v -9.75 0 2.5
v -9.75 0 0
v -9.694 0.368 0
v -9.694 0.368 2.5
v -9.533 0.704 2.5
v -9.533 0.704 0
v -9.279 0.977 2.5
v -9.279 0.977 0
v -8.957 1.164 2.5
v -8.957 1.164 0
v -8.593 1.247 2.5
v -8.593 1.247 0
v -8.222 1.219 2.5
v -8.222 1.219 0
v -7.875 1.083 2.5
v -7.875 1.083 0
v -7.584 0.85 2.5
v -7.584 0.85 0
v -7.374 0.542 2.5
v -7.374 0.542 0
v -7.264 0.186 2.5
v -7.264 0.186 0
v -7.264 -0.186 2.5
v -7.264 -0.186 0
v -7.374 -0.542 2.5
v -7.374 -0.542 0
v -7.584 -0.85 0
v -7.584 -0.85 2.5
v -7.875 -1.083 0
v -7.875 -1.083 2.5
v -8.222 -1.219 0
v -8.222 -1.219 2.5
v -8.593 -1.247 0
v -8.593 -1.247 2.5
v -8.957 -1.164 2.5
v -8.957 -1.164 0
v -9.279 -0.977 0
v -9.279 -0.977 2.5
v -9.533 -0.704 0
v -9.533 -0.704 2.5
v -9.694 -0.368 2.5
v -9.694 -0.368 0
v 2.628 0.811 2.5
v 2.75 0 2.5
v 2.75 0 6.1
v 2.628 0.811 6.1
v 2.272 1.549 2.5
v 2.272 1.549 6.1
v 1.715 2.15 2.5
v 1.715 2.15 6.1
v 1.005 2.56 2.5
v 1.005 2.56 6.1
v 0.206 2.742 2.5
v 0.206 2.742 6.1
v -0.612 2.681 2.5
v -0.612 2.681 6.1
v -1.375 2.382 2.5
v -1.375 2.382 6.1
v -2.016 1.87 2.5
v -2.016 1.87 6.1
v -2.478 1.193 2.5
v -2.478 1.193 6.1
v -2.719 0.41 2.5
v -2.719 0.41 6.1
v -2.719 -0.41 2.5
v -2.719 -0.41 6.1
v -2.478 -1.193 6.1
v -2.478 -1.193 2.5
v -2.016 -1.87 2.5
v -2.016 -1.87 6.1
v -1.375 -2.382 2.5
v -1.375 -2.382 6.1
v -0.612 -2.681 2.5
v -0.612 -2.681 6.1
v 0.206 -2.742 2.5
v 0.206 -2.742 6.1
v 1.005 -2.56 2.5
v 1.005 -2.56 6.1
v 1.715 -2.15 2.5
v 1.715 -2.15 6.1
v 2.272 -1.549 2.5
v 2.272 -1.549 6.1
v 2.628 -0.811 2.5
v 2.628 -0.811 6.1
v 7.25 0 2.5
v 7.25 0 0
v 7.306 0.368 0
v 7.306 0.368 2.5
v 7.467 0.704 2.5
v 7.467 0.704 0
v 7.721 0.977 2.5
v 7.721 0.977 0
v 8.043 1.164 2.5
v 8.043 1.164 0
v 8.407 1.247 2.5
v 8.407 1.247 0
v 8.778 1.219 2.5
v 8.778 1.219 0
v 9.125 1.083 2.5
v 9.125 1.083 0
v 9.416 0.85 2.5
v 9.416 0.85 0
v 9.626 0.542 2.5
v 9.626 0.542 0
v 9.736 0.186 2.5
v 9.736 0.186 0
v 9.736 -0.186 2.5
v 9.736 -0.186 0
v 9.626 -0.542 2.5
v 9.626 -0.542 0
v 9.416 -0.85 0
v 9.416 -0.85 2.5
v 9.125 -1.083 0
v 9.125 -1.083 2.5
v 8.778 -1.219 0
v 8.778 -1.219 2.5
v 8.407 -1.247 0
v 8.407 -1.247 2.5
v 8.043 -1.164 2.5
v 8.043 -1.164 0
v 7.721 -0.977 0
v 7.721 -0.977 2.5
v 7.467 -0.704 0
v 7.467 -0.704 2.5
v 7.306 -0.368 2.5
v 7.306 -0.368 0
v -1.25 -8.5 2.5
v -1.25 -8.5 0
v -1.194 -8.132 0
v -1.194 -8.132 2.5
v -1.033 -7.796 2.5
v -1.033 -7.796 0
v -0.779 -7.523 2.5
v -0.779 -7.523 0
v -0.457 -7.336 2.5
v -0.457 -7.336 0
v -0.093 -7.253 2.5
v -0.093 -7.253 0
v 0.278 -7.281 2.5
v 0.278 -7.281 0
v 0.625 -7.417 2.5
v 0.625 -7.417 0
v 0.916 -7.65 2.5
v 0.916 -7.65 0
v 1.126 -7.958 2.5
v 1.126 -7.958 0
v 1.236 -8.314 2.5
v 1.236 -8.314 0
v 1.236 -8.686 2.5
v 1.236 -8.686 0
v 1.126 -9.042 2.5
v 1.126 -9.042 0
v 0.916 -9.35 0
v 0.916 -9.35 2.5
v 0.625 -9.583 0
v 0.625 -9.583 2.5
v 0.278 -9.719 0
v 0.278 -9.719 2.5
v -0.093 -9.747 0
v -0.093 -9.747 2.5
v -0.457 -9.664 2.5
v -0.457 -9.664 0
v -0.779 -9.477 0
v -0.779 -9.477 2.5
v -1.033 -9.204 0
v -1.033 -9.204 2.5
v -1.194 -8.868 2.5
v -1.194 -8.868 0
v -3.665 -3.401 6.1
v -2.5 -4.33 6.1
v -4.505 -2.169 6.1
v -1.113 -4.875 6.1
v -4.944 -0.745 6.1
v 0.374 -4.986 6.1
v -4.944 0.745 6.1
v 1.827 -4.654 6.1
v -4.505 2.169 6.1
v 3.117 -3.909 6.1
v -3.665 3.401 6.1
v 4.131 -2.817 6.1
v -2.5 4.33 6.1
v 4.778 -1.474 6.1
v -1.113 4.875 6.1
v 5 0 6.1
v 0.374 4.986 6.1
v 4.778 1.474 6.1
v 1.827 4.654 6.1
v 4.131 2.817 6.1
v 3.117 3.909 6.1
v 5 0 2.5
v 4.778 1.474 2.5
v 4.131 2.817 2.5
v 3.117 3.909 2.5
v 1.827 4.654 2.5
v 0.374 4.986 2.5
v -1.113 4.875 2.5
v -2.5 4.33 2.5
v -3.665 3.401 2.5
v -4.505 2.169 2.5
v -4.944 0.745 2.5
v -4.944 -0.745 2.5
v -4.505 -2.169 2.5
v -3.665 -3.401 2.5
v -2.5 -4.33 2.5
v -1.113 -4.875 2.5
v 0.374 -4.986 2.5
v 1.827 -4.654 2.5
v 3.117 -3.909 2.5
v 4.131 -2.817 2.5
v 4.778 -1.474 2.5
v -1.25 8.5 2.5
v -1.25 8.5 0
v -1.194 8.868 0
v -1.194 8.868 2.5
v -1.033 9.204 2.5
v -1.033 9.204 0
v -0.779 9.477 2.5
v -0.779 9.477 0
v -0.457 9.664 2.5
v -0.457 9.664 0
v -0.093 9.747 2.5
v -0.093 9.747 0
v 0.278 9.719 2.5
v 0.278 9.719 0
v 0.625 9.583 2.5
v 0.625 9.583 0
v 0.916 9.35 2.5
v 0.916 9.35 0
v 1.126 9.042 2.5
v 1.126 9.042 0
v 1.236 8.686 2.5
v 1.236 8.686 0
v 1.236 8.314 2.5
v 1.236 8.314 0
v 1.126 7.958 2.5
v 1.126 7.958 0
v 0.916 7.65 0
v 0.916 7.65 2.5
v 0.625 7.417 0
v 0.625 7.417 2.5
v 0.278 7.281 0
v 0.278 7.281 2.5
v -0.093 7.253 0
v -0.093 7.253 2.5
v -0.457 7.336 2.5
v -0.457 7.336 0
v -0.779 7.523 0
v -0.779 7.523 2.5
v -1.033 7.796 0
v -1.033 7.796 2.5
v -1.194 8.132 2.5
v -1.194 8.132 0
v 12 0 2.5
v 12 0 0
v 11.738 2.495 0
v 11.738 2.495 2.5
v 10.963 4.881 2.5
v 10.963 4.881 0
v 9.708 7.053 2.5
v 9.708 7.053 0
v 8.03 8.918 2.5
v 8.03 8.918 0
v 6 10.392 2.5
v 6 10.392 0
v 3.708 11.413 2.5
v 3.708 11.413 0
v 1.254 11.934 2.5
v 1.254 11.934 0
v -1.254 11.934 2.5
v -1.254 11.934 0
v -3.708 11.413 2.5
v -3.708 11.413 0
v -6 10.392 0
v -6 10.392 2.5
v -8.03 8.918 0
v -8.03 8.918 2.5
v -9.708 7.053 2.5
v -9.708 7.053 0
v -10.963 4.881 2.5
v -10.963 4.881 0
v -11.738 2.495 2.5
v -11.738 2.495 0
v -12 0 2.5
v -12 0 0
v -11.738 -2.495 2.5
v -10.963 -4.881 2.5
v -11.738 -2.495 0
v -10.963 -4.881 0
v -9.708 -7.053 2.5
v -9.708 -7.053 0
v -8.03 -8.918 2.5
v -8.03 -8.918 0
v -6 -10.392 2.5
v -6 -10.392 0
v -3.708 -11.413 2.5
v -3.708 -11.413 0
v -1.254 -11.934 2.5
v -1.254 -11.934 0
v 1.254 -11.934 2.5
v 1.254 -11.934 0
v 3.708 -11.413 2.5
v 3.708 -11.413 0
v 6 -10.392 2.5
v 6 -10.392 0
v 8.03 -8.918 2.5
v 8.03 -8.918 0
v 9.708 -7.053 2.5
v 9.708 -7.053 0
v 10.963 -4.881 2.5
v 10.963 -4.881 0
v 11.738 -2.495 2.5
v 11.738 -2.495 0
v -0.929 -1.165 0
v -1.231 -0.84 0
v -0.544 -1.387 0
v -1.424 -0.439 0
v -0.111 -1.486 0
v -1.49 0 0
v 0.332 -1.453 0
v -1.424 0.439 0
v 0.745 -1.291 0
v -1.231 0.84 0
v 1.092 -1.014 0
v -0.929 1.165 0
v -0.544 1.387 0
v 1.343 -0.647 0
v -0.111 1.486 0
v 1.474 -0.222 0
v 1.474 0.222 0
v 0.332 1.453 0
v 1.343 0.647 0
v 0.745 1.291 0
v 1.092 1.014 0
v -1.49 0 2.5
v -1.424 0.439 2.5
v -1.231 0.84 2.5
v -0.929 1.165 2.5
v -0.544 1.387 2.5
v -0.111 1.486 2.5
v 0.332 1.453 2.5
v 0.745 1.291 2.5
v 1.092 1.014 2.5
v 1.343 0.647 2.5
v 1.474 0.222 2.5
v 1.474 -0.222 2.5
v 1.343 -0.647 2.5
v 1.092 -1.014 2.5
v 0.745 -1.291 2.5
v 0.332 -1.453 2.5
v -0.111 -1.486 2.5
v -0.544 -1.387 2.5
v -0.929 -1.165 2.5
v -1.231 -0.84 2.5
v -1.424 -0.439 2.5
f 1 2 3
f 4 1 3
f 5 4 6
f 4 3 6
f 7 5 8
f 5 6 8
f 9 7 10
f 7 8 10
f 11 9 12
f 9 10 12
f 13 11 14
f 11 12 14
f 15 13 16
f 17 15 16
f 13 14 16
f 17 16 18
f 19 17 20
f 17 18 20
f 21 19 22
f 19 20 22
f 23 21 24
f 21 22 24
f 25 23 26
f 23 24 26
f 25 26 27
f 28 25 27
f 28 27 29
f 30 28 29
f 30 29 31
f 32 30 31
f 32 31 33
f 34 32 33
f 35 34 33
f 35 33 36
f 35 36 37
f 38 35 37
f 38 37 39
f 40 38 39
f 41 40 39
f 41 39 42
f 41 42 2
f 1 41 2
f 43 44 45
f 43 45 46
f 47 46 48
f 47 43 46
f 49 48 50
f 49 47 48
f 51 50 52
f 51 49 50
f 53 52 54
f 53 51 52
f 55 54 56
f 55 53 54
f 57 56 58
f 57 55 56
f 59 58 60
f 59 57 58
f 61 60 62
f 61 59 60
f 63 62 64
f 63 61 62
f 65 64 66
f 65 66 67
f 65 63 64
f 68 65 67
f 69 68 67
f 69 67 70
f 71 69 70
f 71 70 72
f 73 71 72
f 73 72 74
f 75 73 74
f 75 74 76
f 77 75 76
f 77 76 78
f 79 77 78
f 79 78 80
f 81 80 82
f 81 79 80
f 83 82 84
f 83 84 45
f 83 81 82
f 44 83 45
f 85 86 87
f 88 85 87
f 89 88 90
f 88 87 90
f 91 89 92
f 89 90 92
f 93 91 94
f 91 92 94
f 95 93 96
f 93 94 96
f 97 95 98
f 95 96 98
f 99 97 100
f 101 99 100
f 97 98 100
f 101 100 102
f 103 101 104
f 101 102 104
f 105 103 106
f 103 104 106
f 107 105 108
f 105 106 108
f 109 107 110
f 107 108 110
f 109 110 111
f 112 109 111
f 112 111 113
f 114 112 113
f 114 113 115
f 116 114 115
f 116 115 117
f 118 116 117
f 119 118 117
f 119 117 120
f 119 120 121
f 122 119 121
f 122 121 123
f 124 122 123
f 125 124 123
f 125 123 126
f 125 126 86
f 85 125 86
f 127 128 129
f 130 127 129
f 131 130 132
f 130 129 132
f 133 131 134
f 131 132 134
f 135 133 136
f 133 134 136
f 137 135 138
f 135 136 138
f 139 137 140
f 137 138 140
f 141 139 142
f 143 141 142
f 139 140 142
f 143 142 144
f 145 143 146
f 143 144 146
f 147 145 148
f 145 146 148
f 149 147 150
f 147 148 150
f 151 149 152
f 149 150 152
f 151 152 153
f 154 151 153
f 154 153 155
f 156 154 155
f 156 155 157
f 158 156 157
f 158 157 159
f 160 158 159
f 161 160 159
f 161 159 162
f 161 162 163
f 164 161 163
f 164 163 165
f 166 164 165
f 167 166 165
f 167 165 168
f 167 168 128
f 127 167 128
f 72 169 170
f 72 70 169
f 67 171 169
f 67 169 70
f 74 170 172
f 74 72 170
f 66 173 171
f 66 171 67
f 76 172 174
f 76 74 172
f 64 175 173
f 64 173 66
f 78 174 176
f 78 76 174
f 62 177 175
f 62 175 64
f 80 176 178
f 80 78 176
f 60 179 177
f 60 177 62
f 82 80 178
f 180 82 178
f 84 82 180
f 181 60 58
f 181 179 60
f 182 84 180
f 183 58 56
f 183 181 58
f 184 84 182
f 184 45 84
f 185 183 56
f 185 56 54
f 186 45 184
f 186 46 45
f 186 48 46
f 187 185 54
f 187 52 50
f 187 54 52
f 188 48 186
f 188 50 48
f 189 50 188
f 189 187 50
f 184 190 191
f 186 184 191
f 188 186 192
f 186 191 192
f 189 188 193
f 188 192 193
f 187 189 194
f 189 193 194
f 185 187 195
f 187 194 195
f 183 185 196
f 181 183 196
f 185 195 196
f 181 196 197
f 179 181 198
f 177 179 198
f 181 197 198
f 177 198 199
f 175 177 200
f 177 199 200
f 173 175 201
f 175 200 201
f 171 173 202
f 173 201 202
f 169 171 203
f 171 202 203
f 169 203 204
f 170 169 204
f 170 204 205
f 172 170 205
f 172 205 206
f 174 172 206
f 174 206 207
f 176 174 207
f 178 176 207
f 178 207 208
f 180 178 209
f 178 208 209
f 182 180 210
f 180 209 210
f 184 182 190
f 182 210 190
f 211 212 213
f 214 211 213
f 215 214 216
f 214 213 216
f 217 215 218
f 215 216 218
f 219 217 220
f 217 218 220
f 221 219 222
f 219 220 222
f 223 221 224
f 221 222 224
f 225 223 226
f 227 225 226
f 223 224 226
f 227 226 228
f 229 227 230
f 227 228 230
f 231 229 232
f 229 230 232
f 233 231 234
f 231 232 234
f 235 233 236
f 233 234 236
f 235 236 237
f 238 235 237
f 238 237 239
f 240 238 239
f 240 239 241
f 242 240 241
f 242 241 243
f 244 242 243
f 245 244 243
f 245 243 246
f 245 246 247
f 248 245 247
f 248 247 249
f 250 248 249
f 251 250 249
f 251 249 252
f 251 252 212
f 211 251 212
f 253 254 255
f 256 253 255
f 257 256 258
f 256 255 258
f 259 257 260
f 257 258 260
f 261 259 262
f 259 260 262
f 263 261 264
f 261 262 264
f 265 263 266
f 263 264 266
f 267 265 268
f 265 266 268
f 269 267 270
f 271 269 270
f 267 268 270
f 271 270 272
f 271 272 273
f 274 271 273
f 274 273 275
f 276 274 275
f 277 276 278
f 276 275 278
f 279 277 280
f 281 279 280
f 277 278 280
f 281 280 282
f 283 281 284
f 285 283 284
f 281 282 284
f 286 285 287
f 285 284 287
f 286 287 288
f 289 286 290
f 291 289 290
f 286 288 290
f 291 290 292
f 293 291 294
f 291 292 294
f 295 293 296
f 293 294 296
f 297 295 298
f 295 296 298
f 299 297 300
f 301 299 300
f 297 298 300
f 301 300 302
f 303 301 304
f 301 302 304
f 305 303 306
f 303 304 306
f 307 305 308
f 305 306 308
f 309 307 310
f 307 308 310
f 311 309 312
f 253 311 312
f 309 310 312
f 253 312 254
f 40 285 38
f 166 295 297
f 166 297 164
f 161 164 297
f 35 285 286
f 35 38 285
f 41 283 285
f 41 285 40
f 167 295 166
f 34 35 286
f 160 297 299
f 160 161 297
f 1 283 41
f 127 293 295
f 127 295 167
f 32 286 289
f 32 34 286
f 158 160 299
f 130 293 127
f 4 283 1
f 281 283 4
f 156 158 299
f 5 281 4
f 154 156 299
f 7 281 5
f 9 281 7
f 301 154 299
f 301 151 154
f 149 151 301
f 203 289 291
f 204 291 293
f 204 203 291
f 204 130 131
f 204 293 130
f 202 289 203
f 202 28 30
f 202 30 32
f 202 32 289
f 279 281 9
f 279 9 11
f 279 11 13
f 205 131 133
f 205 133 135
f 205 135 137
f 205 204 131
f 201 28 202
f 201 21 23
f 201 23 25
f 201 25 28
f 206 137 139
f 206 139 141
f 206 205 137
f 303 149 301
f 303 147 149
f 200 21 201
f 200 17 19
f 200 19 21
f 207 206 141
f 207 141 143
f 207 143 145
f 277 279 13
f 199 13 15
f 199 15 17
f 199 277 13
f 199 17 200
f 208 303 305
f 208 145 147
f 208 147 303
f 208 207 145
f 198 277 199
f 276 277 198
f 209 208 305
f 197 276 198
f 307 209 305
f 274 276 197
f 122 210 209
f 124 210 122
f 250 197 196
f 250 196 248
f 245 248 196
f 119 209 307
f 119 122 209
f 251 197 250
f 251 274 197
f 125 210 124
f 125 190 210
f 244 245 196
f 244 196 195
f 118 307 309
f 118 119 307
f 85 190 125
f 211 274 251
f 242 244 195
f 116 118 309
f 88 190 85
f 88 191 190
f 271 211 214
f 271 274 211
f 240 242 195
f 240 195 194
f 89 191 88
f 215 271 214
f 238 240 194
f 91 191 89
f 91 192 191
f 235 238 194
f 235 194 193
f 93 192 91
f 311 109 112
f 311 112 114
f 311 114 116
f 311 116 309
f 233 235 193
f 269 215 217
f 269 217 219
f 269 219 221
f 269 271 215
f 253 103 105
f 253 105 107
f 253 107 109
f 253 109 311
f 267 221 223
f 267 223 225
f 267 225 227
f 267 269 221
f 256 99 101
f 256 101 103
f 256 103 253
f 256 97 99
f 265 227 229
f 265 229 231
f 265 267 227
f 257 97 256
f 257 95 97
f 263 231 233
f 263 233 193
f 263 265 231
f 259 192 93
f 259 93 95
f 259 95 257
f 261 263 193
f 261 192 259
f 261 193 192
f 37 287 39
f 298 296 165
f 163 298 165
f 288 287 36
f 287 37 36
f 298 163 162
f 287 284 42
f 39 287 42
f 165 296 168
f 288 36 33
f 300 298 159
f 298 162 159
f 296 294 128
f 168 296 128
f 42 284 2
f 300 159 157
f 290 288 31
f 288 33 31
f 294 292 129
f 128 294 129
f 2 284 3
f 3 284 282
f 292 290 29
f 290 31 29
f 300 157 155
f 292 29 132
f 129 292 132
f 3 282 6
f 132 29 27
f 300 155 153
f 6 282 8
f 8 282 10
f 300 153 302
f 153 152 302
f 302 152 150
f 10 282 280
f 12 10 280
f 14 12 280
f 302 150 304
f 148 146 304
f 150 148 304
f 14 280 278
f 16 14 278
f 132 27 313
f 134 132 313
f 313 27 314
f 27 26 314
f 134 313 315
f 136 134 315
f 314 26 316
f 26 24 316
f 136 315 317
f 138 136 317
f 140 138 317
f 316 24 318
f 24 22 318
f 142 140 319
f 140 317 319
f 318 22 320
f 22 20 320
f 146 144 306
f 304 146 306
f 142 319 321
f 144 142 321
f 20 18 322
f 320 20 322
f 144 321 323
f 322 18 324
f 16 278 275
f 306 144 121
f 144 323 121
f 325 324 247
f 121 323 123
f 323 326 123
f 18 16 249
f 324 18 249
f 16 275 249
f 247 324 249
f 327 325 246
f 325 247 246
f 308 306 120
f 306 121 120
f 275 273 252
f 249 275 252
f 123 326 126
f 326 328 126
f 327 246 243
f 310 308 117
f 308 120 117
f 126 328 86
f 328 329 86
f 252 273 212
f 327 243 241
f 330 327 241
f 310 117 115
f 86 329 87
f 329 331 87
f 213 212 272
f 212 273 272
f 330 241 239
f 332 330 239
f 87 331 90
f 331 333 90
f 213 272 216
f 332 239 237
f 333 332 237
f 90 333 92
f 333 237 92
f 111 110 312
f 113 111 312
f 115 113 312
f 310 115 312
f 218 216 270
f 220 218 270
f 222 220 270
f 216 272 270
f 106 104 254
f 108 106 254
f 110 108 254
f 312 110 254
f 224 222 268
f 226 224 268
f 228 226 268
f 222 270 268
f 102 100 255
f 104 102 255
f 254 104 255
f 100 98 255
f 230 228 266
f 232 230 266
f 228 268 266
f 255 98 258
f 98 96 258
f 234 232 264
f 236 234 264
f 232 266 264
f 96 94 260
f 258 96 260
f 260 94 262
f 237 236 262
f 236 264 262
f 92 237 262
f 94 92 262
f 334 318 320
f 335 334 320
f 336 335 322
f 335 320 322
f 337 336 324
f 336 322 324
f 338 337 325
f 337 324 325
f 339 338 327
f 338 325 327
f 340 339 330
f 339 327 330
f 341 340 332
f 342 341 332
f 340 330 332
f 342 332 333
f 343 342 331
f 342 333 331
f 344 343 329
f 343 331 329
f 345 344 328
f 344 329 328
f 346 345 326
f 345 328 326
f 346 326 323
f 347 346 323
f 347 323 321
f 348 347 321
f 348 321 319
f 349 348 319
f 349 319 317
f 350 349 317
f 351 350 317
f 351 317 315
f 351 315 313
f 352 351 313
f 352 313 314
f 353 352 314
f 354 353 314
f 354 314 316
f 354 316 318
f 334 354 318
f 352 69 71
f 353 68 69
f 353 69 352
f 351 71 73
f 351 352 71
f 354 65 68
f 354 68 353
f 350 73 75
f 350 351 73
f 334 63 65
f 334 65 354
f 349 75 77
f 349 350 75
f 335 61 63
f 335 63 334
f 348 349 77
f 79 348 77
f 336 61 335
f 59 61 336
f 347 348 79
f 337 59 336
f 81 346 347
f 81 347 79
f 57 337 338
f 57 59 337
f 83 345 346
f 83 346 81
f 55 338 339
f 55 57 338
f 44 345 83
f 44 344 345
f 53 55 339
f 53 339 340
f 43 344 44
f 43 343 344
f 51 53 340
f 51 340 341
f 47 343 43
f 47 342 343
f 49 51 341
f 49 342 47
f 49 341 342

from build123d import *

# Parameters (mm, degrees)
ESQUISSE1_R             = 12
BOSS_EXTRU_1_DEPTH      = 2.5
ESQUISSE2_R             = 5
ESQUISSE2_R_2           = 2.75
BOSS_EXTRU_2_DEPTH      = 3.6
ESQUISSE3_R             = 1.490305946
ESQUISSE3_R_2           = 1.25
ENL_V_MAT_EXTRU_1_DEPTH = 19.033579789


with BuildPart() as part:
    # Esquisse1 → Boss.-Extru.1 (new body)
    with BuildSketch(Plane.XY):
        Circle(ESQUISSE1_R)
    extrude(amount=BOSS_EXTRU_1_DEPTH)

    # Esquisse2 → Boss.-Extru.2 (add)
    with BuildSketch(Plane.XY.offset(2.5)):
        Circle(ESQUISSE2_R)
        Circle(ESQUISSE2_R_2, mode=Mode.SUBTRACT)
    extrude(amount=BOSS_EXTRU_2_DEPTH)

    # Esquisse3 → Enlèv. mat.-Extru.1 (cut, through all)
    with BuildSketch(Plane(origin=(0, 0, 0), x_dir=(-1, 0, 0), z_dir=(0, 0, -1))):
        Circle(ESQUISSE3_R)
        with Locations((0, 8.5)):
            Circle(ESQUISSE3_R_2)
        with Locations((8.5, 0)):
            Circle(ESQUISSE3_R_2)
        with Locations((0, -8.5)):
            Circle(ESQUISSE3_R_2)
        with Locations((-8.5, 0)):
            Circle(ESQUISSE3_R_2)
    extrude(amount=-ENL_V_MAT_EXTRU_1_DEPTH, mode=Mode.SUBTRACT)


solid = part.part
